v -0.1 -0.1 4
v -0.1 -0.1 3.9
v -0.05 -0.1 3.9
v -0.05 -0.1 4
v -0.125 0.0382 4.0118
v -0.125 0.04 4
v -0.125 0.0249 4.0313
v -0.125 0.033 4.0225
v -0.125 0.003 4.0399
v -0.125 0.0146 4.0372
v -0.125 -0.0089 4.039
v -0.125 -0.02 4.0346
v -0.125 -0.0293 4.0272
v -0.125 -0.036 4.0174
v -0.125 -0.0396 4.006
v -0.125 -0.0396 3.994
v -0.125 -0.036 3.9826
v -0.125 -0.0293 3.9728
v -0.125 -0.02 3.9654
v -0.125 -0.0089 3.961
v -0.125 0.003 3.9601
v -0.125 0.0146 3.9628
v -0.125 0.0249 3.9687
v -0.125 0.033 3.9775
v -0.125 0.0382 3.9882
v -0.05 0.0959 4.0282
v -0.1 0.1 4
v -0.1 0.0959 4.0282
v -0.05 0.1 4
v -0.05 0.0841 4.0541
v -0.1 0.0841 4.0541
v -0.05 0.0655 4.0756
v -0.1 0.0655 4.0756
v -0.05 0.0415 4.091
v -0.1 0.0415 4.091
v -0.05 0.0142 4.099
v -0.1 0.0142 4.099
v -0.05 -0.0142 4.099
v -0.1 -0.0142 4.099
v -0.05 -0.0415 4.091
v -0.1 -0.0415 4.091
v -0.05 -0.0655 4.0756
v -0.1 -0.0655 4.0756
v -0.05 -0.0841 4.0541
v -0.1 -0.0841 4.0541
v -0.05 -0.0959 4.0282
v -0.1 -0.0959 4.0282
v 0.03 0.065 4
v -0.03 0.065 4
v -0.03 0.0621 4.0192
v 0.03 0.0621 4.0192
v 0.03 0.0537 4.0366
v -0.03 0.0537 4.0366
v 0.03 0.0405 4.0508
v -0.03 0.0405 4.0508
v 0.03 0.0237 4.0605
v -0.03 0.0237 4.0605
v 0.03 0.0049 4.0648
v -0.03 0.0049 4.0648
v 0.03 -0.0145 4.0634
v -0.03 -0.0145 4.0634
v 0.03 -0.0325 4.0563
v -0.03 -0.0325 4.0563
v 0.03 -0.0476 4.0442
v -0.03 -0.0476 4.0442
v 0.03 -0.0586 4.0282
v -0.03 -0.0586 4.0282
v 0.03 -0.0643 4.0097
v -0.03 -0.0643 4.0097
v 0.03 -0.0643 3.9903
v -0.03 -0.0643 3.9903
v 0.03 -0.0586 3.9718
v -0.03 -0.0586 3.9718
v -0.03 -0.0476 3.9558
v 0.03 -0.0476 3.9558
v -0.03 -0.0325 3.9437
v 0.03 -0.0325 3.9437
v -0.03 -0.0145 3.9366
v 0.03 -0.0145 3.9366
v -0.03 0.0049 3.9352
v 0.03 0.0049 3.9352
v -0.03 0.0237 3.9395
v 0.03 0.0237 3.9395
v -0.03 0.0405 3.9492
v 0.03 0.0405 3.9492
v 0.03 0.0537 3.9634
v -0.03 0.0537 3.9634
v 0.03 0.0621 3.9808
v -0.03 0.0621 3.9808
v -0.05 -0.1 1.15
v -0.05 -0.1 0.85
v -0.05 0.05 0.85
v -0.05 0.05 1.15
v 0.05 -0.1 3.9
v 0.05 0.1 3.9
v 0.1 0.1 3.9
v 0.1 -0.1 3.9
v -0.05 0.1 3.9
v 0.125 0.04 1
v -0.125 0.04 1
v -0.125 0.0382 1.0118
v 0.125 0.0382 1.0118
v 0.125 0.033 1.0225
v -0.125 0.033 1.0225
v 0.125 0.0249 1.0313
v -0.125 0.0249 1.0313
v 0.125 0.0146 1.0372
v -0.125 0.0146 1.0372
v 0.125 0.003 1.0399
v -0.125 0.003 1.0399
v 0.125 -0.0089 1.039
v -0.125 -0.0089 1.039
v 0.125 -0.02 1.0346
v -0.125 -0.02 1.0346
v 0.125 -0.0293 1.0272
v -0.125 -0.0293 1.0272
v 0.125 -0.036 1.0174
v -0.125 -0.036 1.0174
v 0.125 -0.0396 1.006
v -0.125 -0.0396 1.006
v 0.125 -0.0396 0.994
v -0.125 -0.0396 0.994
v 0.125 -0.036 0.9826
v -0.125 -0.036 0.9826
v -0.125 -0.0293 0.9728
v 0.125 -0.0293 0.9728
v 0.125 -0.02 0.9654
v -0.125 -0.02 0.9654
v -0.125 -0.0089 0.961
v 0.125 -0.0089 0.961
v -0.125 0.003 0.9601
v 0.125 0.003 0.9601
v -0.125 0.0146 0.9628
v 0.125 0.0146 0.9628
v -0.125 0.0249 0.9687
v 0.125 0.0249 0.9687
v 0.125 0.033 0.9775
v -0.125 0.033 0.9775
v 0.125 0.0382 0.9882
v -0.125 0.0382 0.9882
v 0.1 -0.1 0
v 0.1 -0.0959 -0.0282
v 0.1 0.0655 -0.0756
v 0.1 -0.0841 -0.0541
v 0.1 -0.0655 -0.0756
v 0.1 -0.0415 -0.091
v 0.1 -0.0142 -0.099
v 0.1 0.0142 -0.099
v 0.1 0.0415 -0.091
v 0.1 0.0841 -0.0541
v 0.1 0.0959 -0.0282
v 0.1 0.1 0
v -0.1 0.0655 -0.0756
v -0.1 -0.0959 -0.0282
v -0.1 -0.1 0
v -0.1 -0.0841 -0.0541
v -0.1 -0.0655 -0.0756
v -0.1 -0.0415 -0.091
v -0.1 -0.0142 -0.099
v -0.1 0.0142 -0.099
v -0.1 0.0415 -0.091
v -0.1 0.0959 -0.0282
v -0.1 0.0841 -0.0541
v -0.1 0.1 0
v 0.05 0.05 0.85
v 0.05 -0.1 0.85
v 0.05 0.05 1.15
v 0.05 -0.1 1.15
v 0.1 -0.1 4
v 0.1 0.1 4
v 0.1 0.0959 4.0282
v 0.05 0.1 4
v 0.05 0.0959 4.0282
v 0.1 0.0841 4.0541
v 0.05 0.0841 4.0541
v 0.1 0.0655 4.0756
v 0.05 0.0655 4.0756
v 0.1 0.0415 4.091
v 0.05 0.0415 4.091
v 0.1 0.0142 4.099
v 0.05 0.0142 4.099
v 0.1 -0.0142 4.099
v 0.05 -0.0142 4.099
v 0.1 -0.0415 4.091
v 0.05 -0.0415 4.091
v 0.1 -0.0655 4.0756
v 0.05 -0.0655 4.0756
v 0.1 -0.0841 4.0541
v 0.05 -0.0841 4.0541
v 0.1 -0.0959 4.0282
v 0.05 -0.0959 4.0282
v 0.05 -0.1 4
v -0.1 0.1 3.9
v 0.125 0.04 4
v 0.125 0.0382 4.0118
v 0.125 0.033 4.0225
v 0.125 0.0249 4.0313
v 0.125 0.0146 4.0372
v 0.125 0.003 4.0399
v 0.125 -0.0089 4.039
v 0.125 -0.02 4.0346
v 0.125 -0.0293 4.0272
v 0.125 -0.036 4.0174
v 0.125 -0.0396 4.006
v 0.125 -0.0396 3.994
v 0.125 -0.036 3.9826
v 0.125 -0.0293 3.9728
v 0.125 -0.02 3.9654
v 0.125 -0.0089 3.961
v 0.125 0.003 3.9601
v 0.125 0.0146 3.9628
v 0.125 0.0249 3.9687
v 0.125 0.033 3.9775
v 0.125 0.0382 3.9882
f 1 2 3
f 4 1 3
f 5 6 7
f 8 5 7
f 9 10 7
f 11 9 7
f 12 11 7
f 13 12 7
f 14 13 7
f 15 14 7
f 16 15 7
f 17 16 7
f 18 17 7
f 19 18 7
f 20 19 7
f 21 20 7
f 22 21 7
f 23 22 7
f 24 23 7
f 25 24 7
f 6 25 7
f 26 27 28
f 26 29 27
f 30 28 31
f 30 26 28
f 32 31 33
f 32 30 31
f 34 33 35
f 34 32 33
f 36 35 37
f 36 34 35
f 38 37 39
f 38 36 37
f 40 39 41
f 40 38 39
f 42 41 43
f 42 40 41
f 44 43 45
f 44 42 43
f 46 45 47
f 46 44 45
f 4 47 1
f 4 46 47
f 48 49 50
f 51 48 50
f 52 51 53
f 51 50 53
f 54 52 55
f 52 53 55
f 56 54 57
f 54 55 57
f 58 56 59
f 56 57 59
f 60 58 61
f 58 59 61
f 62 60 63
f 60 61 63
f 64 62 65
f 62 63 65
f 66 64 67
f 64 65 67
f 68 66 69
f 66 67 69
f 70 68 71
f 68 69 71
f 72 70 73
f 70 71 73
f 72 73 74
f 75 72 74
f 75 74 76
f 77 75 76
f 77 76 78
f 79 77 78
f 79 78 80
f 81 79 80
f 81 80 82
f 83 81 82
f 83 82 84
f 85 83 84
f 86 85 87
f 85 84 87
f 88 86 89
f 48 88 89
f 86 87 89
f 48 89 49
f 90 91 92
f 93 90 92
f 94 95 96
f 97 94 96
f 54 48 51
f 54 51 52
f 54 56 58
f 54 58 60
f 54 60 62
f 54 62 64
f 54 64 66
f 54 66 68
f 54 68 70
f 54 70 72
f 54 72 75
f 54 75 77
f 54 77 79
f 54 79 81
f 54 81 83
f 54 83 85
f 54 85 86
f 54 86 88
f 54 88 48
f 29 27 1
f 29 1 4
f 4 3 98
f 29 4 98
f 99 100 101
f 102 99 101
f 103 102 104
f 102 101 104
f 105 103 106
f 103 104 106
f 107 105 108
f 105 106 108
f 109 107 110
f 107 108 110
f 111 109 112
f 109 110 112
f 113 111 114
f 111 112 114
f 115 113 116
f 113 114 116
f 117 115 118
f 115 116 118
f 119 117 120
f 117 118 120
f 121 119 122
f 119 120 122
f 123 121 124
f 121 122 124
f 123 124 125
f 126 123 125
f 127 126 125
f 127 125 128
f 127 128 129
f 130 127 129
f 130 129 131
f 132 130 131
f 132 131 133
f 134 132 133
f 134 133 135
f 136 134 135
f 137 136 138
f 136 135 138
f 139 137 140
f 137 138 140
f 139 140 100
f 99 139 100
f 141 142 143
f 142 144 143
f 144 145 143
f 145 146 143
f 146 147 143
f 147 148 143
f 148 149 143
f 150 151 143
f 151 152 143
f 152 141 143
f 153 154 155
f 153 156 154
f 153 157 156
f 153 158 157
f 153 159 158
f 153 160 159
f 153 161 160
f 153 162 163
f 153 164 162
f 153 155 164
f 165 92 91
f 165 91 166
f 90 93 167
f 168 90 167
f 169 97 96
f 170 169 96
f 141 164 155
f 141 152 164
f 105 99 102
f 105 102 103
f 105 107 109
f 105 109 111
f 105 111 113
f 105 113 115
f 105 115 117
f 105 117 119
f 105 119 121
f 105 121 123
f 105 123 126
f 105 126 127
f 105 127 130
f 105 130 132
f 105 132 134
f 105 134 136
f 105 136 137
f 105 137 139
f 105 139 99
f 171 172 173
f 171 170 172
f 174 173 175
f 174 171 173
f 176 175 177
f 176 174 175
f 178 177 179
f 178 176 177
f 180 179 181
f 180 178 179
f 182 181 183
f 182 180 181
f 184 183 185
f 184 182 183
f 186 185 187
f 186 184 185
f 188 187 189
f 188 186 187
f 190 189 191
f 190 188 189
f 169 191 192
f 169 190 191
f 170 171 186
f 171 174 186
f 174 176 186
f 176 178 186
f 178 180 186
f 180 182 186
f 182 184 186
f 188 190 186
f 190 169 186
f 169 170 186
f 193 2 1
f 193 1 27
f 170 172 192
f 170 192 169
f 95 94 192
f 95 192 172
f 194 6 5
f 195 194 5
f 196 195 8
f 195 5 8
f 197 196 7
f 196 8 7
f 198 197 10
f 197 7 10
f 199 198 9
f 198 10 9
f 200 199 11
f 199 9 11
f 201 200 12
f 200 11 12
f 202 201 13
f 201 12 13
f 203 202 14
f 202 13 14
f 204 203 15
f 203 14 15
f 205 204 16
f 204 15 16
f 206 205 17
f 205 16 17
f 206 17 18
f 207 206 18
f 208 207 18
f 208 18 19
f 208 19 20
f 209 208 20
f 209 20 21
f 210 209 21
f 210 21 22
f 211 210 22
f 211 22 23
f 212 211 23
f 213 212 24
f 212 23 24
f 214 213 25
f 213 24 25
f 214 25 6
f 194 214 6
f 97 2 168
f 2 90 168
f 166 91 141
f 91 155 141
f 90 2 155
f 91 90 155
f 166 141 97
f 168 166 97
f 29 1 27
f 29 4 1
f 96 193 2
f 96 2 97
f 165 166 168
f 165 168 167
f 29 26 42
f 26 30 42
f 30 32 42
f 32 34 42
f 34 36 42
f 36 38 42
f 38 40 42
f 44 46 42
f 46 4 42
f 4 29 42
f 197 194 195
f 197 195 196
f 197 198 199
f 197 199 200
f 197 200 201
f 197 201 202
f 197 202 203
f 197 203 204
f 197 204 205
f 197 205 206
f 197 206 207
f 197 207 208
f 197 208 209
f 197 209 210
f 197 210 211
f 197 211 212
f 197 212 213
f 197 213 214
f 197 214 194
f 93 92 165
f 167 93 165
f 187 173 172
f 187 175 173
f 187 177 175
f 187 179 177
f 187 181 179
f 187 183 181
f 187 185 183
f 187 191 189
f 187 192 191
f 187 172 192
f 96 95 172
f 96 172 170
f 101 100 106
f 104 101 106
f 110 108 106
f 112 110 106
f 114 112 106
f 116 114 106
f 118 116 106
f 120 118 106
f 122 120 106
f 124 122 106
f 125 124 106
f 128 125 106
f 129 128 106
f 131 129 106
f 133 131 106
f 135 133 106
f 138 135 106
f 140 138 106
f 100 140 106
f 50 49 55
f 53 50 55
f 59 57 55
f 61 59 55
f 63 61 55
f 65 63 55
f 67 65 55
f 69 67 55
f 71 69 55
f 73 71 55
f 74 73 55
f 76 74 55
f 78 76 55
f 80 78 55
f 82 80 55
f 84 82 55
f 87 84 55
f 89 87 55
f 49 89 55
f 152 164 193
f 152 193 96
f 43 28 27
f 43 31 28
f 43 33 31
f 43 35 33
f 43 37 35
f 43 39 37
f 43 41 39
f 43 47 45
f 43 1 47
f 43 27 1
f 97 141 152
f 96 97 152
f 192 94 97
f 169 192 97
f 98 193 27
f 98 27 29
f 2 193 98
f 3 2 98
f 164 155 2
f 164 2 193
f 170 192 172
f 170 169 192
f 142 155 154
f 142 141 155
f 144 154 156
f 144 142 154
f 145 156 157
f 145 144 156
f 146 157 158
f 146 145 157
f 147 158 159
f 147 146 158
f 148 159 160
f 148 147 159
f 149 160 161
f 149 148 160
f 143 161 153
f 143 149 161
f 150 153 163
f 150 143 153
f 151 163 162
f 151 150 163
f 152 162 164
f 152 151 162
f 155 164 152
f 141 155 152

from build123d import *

# Parameters (mm, degrees)
CYLINDER001_W     = 0.1
CYLINDER001_H     = 0.2
CYLINDER001_ANGLE = 180
CYLINDER_R        = 0.04
CYLINDER_DEPTH    = 0.25
CYLINDER002_W     = 0.1
CYLINDER002_H     = 0.05
CYLINDER002_ANGLE = 180
BOX004_W          = 0.1
BOX004_H          = 0.15
BOX004_DEPTH      = 0.3
BOX005_W          = 0.2
BOX005_H          = 0.2
BOX005_DEPTH      = 3.9
BOX_W             = 0.05
BOX_H             = 0.2
BOX_DEPTH         = 0.1
BOX006_W          = 0.05
BOX006_H          = 0.2
BOX006_DEPTH      = 0.1
CYLINDER004_W     = 0.1
CYLINDER004_H     = 0.05
CYLINDER004_ANGLE = 180
CYLINDER005_R     = 0.04
CYLINDER005_DEPTH = 0.25
CYLINDER006_R     = 0.065
CYLINDER006_DEPTH = 0.06


with BuildPart() as cylinder001:
    # Cylinder001 → Cylinder001 (revolve)
    with BuildSketch(Plane(origin=(-0.1, 0, 0), x_dir=(0, -1, 0), z_dir=(0, 0, 1))):
        with Locations((0.05, 0.1)):
            Rectangle(CYLINDER001_W, CYLINDER001_H)
    revolve(axis=Axis((-0.1, 0, 0), (1, 0, 0)), revolution_arc=CYLINDER001_ANGLE)


with BuildPart() as cylinder:
    # Cylinder → Cylinder (new body)
    with BuildSketch(Plane(origin=(-0.125, 0, 1), x_dir=(0, 1, 0), z_dir=(1, 0, 0))):
        Circle(CYLINDER_R)
    extrude(amount=CYLINDER_DEPTH)


with BuildPart() as cylinder002:
    # Cylinder002 → Cylinder002 (revolve)
    with BuildSketch(Plane(origin=(0.05, 0, 4), x_dir=(0, 1, 0), z_dir=(0, 0, -1))):
        with Locations((0.05, 0.025)):
            Rectangle(CYLINDER002_W, CYLINDER002_H)
    revolve(axis=Axis((0.05, 0, 4), (1, 0, 0)), revolution_arc=CYLINDER002_ANGLE)


with BuildPart() as cube004:
    # Box004 → Box004 (new body)
    with BuildSketch(Plane(origin=(-0.05, -0.1, 0.85), x_dir=(1, 0, 0), z_dir=(0, 0, 1))):
        with Locations((0.05, 0.075)):
            Rectangle(BOX004_W, BOX004_H)
    extrude(amount=BOX004_DEPTH)


with BuildPart() as cut:
    # Box005 → Box005 (new body)
    with BuildSketch(Plane(origin=(-0.1, -0.1, 0), x_dir=(1, 0, 0), z_dir=(0, 0, 1))):
        with Locations((0.1, 0.1)):
            Rectangle(BOX005_W, BOX005_H)
    extrude(amount=BOX005_DEPTH)

    # Cut: cut Cube004
    add(cube004.part, mode=Mode.SUBTRACT)


with BuildPart() as cube:
    # Box → Box (new body)
    with BuildSketch(Plane(origin=(0.05, -0.1, 3.9), x_dir=(1, 0, 0), z_dir=(0, 0, 1))):
        with Locations((0.025, 0.1)):
            Rectangle(BOX_W, BOX_H)
    extrude(amount=BOX_DEPTH)


with BuildPart() as cube006:
    # Box006 → Box006 (new body)
    with BuildSketch(Plane(origin=(-0.1, -0.1, 3.9), x_dir=(1, 0, 0), z_dir=(0, 0, 1))):
        with Locations((0.025, 0.1)):
            Rectangle(BOX006_W, BOX006_H)
    extrude(amount=BOX006_DEPTH)


with BuildPart() as cylinder004:
    # Cylinder004 → Cylinder004 (revolve)
    with BuildSketch(Plane(origin=(-0.1, 0, 4), x_dir=(0, 1, 0), z_dir=(0, 0, -1))):
        with Locations((0.05, 0.025)):
            Rectangle(CYLINDER004_W, CYLINDER004_H)
    revolve(axis=Axis((-0.1, 0, 4), (1, 0, 0)), revolution_arc=CYLINDER004_ANGLE)


with BuildPart() as cylinder005:
    # Cylinder005 → Cylinder005 (new body)
    with BuildSketch(Plane(origin=(-0.125, 0, 4), x_dir=(0, 1, 0), z_dir=(1, 0, 0))):
        Circle(CYLINDER005_R)
    extrude(amount=CYLINDER005_DEPTH)


with BuildPart() as cylinder006:
    # Cylinder006 → Cylinder006 (new body)
    with BuildSketch(Plane(origin=(-0.03, 0, 4), x_dir=(0, 1, 0), z_dir=(1, 0, 0))):
        Circle(CYLINDER006_R)
    extrude(amount=CYLINDER006_DEPTH)


solid = Compound([cylinder001.part, cylinder.part, cylinder002.part, cut.part, cube.part, cube006.part, cylinder004.part, cylinder005.part, cylinder006.part])
